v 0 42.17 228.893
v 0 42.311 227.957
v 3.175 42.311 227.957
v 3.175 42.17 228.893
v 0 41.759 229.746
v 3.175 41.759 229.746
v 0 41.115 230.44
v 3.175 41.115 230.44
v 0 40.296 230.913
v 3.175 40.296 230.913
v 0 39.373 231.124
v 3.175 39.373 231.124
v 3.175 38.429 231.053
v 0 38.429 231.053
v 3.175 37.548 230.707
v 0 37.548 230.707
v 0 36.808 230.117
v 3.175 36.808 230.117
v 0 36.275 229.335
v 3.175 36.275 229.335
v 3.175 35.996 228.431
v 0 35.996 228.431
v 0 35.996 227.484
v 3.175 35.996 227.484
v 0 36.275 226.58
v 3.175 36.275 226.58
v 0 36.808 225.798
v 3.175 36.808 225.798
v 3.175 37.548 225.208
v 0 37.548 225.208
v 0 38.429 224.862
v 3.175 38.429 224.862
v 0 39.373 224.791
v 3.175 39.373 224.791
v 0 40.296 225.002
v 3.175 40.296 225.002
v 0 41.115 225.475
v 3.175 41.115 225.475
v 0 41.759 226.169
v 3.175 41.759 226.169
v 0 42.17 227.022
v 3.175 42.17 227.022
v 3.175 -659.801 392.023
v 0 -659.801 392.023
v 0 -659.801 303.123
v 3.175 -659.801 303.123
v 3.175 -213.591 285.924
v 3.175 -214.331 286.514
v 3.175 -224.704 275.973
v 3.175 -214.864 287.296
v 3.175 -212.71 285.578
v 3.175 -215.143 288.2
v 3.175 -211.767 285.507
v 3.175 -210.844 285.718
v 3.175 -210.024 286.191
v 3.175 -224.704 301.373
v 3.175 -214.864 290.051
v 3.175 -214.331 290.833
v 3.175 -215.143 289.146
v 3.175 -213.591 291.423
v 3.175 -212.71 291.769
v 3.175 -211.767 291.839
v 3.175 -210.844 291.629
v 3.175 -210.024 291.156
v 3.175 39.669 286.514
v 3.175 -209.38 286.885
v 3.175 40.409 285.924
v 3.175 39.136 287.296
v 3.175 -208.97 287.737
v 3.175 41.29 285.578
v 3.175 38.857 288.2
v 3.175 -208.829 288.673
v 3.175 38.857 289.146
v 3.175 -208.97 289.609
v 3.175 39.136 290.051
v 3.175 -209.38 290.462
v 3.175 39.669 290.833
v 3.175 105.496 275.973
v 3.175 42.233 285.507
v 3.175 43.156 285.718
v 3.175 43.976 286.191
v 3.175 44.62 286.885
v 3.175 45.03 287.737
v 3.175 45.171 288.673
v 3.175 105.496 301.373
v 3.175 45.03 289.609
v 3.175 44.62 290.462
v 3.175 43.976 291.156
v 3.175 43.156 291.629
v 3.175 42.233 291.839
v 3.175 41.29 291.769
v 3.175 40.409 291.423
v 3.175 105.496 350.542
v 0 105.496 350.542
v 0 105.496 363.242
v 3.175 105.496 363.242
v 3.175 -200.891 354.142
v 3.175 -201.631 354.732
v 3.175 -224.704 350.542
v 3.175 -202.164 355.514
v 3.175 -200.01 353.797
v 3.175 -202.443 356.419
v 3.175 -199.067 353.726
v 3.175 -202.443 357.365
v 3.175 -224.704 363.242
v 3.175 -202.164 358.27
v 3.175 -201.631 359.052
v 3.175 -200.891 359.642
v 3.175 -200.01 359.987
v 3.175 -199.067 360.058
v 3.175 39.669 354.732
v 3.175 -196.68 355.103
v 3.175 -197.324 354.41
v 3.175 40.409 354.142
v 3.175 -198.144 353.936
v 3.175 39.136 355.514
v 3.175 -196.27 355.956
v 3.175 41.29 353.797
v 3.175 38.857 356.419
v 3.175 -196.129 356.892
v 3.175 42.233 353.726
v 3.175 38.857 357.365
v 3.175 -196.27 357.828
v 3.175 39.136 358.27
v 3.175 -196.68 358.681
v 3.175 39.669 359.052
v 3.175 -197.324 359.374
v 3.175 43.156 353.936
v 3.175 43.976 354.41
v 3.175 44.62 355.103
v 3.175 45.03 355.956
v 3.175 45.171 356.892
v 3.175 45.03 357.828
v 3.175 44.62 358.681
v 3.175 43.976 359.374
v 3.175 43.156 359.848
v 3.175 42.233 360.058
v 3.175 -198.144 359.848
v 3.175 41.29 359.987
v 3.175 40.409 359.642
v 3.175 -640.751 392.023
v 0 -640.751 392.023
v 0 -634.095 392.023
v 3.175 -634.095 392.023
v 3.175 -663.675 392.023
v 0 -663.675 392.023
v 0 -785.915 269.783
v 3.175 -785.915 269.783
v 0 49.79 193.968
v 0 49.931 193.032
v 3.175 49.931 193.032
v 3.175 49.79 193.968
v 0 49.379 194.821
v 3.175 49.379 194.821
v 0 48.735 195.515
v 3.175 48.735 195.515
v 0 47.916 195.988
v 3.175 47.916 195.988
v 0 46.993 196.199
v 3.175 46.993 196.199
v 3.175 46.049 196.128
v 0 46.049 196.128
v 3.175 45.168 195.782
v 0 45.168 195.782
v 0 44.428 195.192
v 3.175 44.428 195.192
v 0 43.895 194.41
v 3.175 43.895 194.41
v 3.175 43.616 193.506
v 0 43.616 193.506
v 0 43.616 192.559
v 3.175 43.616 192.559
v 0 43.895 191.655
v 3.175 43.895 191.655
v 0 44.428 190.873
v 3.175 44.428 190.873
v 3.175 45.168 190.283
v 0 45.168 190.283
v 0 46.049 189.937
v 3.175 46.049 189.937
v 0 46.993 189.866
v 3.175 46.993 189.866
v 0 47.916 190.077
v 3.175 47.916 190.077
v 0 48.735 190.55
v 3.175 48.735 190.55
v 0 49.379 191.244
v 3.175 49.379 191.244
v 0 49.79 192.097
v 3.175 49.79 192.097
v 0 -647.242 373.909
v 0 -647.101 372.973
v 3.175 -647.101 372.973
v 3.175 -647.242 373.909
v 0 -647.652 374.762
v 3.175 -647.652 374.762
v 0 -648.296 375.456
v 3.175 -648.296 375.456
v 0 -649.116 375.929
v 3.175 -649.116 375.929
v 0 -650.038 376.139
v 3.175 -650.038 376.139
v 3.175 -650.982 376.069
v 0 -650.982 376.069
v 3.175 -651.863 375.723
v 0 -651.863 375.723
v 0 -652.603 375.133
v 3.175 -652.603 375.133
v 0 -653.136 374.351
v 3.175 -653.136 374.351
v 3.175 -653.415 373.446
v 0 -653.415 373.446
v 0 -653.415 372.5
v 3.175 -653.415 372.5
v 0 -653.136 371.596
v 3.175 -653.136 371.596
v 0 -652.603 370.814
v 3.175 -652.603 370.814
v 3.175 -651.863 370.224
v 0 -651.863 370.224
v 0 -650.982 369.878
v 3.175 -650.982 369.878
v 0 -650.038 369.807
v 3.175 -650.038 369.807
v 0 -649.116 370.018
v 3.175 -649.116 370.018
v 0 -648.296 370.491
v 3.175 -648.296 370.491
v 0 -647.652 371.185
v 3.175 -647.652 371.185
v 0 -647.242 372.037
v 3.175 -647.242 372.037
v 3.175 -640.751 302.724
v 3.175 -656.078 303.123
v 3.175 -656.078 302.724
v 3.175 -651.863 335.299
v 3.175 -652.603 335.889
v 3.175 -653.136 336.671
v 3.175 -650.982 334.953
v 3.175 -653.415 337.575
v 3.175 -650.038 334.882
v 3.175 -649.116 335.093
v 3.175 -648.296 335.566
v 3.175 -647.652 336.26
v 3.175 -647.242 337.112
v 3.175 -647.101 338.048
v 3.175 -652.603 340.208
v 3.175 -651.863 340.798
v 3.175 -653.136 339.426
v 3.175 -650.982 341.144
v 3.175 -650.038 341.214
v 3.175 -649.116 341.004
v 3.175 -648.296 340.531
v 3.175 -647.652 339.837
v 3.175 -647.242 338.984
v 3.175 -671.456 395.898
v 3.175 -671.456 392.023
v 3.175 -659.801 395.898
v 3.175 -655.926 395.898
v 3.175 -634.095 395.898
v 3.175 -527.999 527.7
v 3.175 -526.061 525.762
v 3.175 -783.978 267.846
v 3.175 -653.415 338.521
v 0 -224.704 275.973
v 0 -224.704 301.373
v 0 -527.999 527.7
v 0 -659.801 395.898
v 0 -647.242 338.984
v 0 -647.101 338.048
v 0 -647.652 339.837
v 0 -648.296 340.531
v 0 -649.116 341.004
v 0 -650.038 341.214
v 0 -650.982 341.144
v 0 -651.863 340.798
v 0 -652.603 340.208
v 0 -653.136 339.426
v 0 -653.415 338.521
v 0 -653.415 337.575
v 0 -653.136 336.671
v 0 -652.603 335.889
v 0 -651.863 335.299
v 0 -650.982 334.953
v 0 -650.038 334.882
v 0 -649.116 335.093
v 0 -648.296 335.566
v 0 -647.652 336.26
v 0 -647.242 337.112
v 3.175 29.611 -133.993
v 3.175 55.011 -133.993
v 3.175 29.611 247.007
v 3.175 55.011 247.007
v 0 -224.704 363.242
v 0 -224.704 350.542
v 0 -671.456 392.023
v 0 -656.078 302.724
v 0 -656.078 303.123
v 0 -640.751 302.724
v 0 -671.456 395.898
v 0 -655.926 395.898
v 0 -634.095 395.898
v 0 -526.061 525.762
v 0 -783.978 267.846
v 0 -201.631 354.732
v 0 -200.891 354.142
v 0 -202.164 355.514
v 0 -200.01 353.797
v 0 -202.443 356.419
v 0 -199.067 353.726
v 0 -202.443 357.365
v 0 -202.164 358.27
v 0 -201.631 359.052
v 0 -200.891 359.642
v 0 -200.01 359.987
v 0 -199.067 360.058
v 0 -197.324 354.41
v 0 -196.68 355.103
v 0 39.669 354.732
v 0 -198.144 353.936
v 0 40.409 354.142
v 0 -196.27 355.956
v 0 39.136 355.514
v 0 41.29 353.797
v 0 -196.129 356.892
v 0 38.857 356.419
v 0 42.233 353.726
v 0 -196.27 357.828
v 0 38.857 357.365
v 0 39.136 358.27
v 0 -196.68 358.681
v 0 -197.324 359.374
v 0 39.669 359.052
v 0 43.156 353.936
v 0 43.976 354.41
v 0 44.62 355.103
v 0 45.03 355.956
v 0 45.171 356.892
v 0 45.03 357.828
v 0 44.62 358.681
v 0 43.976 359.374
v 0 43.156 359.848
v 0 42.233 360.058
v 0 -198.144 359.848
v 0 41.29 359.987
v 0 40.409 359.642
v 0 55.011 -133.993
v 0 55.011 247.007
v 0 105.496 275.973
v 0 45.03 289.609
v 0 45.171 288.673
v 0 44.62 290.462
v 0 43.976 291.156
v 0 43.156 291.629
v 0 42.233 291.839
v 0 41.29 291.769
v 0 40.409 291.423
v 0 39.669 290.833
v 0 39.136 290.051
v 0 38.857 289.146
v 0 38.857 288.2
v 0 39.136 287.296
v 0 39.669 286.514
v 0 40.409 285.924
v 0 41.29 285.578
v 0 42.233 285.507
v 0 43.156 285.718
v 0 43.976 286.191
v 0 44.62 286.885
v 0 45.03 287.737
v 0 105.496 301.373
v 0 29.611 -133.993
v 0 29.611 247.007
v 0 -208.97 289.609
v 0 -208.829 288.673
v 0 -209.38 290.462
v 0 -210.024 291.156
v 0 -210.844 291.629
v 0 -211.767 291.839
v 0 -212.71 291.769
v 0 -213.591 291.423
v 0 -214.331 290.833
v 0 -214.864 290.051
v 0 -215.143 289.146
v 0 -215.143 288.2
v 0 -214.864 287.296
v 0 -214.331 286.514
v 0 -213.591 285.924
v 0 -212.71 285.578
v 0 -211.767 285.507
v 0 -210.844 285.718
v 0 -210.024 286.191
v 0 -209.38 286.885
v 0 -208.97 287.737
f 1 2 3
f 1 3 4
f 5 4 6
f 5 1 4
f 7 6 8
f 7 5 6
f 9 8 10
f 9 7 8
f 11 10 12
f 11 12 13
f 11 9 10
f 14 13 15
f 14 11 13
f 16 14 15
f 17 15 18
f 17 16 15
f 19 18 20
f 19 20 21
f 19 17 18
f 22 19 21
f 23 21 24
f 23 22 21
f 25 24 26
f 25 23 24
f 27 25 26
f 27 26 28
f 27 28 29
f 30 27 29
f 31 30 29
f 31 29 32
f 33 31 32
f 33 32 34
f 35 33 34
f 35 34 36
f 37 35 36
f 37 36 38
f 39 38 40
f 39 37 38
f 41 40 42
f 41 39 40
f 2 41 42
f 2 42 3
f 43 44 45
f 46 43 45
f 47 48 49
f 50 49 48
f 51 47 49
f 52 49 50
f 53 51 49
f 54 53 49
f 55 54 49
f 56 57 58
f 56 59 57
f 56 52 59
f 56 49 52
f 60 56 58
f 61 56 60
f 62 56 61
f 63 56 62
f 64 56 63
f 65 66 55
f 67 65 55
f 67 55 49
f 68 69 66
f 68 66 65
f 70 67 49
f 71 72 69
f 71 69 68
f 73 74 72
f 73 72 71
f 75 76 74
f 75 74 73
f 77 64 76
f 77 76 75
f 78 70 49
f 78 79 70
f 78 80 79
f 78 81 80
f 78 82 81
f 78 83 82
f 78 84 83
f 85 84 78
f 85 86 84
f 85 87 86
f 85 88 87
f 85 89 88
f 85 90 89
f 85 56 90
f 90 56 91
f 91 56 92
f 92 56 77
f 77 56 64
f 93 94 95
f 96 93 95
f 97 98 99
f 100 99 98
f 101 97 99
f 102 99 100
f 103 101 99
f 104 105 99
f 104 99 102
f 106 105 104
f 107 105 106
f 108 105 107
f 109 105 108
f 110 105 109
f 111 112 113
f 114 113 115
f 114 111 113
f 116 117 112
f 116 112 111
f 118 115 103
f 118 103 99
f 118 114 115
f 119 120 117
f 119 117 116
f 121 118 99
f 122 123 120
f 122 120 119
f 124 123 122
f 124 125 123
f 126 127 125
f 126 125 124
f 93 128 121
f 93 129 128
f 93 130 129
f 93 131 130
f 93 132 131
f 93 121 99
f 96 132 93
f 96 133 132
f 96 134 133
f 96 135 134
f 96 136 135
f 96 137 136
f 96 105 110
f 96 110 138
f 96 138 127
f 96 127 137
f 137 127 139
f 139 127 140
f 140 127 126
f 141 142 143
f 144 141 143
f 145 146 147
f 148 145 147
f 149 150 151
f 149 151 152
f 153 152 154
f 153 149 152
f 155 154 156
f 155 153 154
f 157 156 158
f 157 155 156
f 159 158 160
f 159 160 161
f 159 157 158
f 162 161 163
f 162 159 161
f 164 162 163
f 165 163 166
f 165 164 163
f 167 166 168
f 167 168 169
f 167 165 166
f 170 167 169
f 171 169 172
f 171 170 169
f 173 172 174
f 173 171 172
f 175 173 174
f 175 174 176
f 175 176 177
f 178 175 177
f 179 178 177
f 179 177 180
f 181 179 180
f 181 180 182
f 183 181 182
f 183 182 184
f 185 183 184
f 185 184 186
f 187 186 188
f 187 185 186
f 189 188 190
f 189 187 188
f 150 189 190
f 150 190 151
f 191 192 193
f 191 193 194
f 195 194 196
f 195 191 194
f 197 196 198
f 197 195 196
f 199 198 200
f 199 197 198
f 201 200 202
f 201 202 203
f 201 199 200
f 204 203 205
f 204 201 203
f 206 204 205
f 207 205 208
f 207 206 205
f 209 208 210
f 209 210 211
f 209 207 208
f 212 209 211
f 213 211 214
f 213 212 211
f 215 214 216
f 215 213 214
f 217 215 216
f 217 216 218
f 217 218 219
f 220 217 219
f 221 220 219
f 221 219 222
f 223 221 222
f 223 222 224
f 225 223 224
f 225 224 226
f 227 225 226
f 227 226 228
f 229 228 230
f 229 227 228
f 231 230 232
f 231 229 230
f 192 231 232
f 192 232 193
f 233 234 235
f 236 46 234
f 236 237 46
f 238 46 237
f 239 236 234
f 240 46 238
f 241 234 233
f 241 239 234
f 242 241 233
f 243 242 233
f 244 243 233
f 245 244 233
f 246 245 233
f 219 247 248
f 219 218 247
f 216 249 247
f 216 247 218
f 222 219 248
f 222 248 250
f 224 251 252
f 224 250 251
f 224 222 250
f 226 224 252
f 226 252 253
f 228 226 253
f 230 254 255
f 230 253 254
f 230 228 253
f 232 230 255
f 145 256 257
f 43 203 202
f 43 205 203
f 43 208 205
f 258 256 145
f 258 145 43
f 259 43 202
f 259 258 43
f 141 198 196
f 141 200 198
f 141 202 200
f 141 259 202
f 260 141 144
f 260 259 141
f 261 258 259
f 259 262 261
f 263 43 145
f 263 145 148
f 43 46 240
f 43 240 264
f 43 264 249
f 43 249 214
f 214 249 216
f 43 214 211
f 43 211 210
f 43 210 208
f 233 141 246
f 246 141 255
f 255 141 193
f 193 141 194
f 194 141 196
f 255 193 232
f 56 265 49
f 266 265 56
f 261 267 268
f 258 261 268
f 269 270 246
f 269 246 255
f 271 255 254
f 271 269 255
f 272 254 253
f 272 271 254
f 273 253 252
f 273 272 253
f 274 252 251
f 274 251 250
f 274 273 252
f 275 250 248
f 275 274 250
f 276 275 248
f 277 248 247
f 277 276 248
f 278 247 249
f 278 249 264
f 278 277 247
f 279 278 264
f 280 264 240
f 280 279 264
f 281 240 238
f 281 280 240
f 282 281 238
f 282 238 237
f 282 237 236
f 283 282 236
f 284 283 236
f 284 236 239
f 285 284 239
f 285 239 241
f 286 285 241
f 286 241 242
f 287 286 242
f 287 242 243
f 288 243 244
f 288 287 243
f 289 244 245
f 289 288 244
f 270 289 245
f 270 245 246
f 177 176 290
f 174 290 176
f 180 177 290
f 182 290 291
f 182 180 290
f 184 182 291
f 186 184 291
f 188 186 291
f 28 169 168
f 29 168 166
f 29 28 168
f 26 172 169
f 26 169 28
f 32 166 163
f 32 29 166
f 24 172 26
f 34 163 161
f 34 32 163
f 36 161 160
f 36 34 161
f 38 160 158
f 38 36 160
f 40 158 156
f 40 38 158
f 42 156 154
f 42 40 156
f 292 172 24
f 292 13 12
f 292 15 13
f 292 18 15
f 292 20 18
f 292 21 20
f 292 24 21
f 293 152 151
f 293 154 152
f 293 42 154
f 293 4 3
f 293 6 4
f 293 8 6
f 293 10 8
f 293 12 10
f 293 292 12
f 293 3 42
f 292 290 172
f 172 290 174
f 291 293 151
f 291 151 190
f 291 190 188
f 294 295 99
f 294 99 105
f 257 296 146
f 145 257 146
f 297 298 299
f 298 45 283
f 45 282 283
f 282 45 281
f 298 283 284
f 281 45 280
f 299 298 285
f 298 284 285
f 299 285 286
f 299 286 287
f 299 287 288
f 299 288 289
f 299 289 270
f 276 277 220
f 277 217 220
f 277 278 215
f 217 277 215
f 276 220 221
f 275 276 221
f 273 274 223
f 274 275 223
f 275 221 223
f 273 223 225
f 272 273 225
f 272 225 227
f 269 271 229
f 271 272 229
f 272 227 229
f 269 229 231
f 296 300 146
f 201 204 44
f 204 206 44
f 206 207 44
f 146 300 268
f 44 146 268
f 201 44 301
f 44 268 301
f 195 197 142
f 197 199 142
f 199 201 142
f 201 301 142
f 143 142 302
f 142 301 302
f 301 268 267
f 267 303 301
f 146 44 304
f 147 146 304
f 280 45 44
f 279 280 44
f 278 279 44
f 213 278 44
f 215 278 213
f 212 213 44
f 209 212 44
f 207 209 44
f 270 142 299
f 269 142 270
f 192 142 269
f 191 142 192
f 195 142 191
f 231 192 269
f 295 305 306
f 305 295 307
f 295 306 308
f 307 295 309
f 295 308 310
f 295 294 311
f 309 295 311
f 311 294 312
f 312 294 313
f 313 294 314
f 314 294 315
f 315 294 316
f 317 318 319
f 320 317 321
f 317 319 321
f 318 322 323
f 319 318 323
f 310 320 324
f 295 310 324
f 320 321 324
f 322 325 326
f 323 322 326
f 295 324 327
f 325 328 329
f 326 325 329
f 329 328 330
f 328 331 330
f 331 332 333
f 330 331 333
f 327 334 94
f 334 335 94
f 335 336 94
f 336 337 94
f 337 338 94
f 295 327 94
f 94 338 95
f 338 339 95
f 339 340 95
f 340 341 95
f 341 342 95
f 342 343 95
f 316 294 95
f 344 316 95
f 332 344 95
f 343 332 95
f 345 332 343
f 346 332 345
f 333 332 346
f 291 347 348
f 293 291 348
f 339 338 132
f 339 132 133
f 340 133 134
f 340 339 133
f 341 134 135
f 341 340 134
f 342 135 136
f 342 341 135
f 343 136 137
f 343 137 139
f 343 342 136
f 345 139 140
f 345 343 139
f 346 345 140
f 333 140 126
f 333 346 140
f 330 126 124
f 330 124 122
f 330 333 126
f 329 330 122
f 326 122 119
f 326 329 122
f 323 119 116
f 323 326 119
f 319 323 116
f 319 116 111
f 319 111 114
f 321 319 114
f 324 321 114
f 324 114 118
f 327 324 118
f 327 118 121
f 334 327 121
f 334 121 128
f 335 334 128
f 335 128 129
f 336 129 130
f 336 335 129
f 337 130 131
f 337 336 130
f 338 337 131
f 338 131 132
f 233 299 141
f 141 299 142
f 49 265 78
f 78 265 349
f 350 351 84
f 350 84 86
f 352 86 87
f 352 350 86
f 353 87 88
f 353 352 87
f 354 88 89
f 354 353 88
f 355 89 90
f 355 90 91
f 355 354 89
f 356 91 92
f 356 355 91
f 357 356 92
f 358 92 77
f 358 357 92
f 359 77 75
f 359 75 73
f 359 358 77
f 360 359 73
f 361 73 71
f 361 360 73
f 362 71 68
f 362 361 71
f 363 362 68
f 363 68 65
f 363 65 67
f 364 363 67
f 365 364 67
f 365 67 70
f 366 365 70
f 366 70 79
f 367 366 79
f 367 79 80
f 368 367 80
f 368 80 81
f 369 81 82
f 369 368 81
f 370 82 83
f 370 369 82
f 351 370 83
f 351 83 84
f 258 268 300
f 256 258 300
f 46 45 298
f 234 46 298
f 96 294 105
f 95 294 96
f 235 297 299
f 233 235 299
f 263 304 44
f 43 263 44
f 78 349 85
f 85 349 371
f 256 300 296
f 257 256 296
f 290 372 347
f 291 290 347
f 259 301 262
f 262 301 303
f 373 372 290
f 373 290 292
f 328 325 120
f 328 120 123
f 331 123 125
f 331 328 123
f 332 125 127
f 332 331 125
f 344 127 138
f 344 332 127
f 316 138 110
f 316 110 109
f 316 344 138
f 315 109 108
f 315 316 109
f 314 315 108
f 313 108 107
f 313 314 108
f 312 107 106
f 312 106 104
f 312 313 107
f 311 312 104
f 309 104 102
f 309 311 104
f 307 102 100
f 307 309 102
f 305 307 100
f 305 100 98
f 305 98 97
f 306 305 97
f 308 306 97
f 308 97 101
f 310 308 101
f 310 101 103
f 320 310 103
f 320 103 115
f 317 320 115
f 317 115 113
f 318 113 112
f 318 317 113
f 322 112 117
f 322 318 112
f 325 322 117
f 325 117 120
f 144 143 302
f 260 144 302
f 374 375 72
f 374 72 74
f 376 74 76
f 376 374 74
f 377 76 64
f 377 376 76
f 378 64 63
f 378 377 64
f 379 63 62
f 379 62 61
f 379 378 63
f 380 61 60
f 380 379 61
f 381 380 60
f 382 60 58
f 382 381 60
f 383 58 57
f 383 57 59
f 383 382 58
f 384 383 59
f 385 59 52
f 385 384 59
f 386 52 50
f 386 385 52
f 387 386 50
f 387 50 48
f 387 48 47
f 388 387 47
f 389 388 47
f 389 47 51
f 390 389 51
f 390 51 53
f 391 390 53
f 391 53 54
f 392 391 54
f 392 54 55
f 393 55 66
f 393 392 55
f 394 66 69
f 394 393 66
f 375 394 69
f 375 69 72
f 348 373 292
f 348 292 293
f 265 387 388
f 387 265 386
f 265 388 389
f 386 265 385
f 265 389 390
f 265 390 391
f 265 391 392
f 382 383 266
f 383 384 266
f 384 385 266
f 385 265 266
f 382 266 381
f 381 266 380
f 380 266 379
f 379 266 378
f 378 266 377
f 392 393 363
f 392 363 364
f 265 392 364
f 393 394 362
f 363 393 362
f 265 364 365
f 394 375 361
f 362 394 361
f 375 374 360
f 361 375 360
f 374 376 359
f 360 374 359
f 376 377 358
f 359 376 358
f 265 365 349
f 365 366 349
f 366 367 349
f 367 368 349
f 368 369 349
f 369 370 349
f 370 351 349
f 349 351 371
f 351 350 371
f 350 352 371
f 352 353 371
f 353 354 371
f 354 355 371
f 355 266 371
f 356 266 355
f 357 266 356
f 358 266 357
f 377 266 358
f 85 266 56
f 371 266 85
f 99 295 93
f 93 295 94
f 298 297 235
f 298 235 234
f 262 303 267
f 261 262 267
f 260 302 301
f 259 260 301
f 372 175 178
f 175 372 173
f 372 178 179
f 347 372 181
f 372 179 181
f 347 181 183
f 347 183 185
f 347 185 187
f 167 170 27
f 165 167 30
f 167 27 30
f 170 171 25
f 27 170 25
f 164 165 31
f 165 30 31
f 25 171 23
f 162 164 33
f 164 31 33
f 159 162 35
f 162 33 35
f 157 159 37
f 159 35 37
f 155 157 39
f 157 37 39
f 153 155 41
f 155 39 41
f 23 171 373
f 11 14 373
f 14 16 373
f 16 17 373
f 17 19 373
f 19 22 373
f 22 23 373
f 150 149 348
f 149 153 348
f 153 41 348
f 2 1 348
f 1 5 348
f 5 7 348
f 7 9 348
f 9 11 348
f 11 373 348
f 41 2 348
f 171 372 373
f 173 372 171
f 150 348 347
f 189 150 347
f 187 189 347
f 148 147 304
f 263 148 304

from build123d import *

# Parameters (mm, degrees)
F0_W     = 25.4
F0_H     = 381
F0_R     = 3.175
F1_DEPTH = 3.175
F2_W     = 330.2
F2_H     = 25.4
F2_R     = 3.175
F3_DEPTH = 3.175
F2_H_2   = 12.7
F2_W_2   = 15.3272473817
F2_H_3   = 0.3989635468


with BuildPart() as f1:
    # F0 (on Right) → F1 (new body)
    with BuildSketch(Plane.YZ):
        with Locations((42.3107426614, 56.5074968708)):
            Rectangle(F0_W, F0_H)
        with Locations((39.1357426614, 227.9574968708)):
            Circle(F0_R, mode=Mode.SUBTRACT)
        with Locations((46.7557426614, 193.0324968708)):
            Circle(F0_R, mode=Mode.SUBTRACT)
    extrude(amount=F1_DEPTH)


with BuildPart() as f3:
    # F2 (on Right) → F3 (new body)
    with BuildSketch(Plane.YZ):
        with Locations((-59.6037783384, 288.6731931647)):
            Rectangle(F2_W, F2_H)
        with Locations((-212.0037783384, 288.6731931647)):
            Circle(F2_R, mode=Mode.SUBTRACT)
        with Locations((41.9962216616, 288.6731931647)):
            Circle(F2_R, mode=Mode.SUBTRACT)
    extrude(amount=F3_DEPTH)


with BuildPart() as f3b:
    # F2 (on Right) → F3, piece 2 (new body)
    with BuildSketch(Plane.YZ):
        with Locations((-59.6037783384, 356.8920088768)):
            Rectangle(F2_W, F2_H_2)
        with Locations((-199.3037783384, 356.8920088768)):
            Circle(F2_R, mode=Mode.SUBTRACT)
        with Locations((41.9962216616, 356.8920088768)):
            Circle(F2_R, mode=Mode.SUBTRACT)
    extrude(amount=F3_DEPTH)


with BuildPart() as f3c:
    # F2 (on Right) → F3, piece 3 (new body)
    with BuildSketch(Plane.YZ):
        Polygon((-655.9261690166, 395.89759154), (-659.8005547995, 392.0232057571), (-640.7505547995, 392.0232057571), (-634.0945363045, 392.0232057571), (-634.0945363045, 395.89759154), align=None)
        Polygon((-640.7505547995, 392.0232057571), (-659.8005547995, 392.0232057571), (-659.8005547995, 303.1232057571), (-656.0778021812, 303.1232057571), (-640.7505547995, 303.1232057571), align=None)
        with Locations((-650.2755547995, 338.0482057571)):
            Circle(F2_R, mode=Mode.SUBTRACT)
        with Locations((-650.2755547995, 372.9732057571)):
            Circle(F2_R, mode=Mode.SUBTRACT)
        Polygon((-783.9779704112, 267.8457901454), (-659.8005547995, 392.0232057571), (-663.6749405824, 392.0232057571), (-785.9151633027, 269.7829830368), align=None)
        Polygon((-663.6749405824, 392.0232057571), (-659.8005547995, 392.0232057571), (-659.8005547995, 395.89759154), align=None)
        Polygon((-659.8005547995, 395.89759154), (-659.8005547995, 392.0232057571), (-655.9261690166, 395.89759154), align=None)
        Polygon((-671.4555621147, 392.0232057571), (-663.6749405824, 392.0232057571), (-659.8005547995, 395.89759154), (-671.4555621147, 395.89759154), align=None)
        Polygon((-527.998517998, 527.6996283415), (-659.8005547995, 395.89759154), (-655.9261690166, 395.89759154), (-526.0613251066, 525.7624354501), align=None)
        with Locations((-648.4141784904, 302.9237239838)):
            Rectangle(F2_W_2, F2_H_3)
    extrude(amount=F3_DEPTH)


solid = Compound([f1.part, f3.part, f3b.part, f3c.part])
